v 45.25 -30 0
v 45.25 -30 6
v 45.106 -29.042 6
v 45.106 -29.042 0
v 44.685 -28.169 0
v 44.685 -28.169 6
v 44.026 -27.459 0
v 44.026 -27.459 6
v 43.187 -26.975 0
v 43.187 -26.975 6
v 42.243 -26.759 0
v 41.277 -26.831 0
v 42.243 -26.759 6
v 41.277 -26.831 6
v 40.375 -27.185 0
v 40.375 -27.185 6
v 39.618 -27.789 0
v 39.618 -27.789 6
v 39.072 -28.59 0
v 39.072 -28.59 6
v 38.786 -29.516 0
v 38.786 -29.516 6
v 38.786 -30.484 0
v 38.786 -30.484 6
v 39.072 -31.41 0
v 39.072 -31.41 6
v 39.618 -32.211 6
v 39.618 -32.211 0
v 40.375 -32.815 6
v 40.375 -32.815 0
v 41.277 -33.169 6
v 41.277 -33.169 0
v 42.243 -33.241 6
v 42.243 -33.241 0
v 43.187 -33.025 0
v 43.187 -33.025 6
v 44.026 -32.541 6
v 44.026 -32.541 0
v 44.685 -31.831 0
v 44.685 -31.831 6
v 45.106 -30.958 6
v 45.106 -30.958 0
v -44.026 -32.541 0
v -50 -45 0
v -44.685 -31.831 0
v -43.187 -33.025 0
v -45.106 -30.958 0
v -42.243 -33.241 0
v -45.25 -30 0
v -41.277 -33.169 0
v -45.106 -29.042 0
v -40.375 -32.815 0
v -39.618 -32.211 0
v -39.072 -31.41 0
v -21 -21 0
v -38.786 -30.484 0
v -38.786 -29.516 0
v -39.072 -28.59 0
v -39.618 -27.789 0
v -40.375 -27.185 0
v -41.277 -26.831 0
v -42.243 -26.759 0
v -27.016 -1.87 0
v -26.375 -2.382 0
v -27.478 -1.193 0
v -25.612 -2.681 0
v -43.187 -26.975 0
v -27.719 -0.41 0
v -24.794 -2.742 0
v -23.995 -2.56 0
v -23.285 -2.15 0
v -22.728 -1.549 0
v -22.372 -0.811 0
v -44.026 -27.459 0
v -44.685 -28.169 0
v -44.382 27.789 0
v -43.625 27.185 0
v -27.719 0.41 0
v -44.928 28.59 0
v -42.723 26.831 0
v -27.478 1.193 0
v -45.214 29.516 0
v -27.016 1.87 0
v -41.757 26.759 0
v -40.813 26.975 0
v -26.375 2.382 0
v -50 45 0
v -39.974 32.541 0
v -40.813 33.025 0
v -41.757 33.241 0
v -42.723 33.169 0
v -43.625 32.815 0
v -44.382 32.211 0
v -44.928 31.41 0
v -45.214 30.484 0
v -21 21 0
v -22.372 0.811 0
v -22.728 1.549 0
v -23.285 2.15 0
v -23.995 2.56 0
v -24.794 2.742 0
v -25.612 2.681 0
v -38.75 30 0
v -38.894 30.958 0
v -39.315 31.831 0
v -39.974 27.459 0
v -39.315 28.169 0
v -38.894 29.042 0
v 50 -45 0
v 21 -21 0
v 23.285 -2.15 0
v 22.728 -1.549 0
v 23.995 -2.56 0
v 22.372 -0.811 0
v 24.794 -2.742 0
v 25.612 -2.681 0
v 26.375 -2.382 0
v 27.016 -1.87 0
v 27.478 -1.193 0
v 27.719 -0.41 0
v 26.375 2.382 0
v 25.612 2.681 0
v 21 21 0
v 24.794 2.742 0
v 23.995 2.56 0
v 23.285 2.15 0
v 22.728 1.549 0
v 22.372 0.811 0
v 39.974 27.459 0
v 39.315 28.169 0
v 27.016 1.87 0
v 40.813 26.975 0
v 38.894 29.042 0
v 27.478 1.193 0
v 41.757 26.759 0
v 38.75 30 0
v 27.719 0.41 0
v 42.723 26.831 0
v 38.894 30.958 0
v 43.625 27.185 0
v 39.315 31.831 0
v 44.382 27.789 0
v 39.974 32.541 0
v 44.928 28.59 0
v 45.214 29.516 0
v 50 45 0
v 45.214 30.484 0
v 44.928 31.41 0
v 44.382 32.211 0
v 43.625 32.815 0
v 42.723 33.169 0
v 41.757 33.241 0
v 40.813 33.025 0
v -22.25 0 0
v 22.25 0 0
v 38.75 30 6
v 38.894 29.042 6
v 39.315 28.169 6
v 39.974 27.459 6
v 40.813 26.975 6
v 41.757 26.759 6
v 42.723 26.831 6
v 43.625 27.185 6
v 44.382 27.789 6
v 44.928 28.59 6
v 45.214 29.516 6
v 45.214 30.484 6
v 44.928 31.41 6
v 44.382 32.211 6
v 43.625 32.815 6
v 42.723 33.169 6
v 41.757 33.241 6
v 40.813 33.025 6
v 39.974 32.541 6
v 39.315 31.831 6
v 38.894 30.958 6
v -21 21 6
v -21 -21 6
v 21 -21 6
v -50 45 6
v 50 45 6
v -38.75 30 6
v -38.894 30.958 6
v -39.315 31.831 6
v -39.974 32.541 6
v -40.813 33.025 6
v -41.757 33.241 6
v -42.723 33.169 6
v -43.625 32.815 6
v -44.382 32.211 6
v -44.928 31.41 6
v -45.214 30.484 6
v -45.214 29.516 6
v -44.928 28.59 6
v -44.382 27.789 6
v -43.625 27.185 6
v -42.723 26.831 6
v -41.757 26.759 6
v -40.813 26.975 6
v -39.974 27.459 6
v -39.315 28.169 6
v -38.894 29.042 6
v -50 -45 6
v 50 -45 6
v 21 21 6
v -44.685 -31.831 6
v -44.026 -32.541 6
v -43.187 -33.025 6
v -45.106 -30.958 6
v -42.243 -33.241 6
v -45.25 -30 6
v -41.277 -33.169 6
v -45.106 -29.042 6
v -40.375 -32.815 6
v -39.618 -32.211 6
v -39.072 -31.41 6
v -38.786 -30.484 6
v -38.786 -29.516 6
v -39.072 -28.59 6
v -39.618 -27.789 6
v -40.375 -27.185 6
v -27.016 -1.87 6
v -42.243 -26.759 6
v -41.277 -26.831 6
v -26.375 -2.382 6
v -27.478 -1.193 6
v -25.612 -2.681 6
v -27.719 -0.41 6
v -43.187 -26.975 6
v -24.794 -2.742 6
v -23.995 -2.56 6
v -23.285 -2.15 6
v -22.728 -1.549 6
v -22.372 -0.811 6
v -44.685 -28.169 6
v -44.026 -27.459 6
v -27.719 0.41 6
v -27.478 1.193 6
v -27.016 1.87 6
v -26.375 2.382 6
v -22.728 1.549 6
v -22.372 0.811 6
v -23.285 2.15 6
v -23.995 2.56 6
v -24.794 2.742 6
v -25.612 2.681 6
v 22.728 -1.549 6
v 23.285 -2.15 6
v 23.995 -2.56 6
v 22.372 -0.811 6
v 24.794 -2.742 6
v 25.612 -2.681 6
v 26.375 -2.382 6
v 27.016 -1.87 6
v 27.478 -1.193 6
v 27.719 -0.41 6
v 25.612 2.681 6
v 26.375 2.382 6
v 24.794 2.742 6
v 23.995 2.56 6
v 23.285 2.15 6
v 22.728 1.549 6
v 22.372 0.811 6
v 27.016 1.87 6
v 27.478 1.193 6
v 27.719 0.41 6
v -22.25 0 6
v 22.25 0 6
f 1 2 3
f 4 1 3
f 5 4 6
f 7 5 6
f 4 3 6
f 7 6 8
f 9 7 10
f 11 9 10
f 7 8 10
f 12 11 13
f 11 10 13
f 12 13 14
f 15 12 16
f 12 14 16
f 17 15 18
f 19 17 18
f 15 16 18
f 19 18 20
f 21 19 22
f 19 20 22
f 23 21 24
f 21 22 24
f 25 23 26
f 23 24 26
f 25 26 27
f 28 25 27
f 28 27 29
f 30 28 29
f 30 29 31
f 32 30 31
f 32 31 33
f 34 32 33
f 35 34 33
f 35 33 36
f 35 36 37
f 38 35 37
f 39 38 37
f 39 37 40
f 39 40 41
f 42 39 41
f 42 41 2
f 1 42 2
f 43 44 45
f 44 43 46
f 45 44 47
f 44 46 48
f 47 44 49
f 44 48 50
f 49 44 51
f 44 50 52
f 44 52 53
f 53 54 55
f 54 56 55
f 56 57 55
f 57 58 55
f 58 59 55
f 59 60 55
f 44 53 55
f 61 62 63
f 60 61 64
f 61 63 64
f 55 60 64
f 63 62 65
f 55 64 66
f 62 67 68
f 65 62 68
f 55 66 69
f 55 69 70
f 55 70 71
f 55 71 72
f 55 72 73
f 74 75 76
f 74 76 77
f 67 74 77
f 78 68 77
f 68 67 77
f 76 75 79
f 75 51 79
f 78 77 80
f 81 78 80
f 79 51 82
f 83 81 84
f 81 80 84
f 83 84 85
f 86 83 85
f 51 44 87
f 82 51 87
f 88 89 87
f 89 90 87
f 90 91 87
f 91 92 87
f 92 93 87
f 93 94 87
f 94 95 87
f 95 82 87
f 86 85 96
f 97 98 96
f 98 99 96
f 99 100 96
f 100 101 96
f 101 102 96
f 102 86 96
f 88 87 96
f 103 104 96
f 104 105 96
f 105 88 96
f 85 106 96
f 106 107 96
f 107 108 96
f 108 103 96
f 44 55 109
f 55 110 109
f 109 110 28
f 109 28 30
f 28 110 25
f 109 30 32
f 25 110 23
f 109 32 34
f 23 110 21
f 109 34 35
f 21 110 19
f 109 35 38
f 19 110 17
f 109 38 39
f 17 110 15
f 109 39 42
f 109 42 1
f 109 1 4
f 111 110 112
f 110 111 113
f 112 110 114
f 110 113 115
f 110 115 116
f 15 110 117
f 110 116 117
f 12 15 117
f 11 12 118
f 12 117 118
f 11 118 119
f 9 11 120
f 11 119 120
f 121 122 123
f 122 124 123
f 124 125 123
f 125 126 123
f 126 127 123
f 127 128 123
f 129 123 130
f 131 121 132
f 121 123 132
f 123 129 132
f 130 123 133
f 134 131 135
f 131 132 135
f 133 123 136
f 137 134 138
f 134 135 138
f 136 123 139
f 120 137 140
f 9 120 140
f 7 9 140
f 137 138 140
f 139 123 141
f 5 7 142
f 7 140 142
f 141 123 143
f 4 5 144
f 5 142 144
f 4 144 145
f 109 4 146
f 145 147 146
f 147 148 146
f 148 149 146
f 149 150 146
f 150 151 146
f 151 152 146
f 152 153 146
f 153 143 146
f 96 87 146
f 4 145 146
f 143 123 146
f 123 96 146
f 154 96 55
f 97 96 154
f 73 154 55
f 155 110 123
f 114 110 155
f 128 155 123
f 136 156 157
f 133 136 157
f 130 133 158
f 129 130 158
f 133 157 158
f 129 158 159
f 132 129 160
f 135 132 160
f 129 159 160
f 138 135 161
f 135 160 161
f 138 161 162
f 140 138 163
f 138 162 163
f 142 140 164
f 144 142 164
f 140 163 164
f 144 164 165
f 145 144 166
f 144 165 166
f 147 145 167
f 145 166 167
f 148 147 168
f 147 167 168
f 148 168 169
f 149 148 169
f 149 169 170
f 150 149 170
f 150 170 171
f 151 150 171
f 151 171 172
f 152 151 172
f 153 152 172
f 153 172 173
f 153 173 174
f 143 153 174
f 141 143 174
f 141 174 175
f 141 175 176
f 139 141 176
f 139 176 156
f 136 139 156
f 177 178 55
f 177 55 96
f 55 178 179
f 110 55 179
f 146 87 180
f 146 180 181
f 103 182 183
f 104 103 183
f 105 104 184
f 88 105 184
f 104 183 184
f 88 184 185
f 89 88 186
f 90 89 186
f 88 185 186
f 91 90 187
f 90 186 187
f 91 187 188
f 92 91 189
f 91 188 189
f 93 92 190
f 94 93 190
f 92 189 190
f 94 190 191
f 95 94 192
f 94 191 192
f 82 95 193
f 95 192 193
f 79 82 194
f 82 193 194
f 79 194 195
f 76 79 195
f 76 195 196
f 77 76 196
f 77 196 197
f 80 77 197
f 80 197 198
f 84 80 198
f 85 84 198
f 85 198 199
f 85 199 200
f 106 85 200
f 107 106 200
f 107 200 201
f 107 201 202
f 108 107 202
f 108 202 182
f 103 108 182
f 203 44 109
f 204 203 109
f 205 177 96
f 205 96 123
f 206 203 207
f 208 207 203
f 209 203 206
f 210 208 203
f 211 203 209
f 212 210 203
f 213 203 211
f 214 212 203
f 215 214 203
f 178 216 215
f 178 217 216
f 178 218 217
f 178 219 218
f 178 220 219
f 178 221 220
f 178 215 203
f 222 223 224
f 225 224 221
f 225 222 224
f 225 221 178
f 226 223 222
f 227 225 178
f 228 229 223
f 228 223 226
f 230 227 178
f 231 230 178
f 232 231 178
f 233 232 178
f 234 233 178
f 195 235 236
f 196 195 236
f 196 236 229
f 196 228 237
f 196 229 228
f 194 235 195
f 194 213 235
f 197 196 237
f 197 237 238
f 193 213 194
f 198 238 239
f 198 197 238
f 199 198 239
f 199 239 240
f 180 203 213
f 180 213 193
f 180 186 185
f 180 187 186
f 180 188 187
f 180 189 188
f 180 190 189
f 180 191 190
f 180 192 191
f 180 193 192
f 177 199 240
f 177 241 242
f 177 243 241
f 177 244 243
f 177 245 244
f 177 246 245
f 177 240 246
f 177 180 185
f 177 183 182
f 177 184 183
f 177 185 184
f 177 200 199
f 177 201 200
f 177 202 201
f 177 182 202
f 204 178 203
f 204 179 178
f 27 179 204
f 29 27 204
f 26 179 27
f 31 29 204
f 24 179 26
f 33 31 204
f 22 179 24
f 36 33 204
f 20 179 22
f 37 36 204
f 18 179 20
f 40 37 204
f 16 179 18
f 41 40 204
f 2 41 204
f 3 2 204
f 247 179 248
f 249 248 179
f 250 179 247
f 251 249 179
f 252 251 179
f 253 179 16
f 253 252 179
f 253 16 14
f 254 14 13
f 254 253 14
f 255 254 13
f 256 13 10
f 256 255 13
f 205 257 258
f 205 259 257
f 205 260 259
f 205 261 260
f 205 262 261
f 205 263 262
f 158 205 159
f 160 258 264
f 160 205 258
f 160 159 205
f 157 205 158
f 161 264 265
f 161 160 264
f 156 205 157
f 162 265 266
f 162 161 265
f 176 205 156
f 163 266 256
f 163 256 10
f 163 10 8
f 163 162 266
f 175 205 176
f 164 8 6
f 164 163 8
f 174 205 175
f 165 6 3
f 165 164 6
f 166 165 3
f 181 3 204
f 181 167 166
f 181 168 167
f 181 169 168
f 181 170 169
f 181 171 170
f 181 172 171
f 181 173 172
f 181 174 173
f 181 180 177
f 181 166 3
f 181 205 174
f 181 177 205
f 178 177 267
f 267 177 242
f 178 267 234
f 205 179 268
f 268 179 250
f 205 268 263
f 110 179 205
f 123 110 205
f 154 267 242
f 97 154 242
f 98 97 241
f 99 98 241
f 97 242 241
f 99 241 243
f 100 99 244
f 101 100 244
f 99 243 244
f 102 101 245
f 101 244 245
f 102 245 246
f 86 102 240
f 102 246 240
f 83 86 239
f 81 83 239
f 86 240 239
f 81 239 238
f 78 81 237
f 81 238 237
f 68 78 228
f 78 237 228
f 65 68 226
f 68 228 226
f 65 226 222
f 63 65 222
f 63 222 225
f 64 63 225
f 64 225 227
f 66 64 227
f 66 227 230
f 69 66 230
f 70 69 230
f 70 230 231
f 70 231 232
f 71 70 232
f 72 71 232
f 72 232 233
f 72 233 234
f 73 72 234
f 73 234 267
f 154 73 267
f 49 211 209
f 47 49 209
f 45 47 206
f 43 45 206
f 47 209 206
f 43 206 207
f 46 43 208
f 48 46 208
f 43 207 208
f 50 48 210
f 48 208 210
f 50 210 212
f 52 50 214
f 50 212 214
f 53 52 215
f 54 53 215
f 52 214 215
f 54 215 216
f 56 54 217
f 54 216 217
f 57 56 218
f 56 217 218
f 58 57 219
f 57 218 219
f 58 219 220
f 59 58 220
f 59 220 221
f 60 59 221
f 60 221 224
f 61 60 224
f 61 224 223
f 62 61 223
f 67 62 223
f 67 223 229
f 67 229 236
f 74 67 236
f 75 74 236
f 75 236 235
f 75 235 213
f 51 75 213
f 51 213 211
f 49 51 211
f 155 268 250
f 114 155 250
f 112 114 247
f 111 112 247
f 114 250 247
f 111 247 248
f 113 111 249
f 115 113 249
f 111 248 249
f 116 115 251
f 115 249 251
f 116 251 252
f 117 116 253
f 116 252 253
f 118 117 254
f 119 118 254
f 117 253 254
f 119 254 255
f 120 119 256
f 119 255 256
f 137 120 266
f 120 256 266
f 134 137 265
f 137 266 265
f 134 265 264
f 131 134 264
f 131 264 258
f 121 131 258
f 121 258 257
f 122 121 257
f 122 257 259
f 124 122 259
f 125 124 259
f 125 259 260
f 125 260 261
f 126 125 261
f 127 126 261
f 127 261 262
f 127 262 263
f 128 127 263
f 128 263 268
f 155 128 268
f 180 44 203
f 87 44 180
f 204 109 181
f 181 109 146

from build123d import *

# Parameters (mm, degrees)
SKETCH1_W           = 100
SKETCH1_H           = 90
BOSS_EXTRUDE1_DEPTH = 6
SKETCH2_R           = 2.75
SKETCH2_R_2         = 3.25
CUT_EXTRUDE1_DEPTH  = 68.53517602
SKETCH3_W           = 42
SKETCH3_H           = 42
CUT_EXTRUDE2_DEPTH  = 10


with BuildPart() as part:
    # Sketch1 → Boss-Extrude1 (new body)
    with BuildSketch(Plane.XY):
        Rectangle(SKETCH1_W, SKETCH1_H)
    extrude(amount=BOSS_EXTRUDE1_DEPTH)

    # Sketch2 → Cut-Extrude1 (cut, through all)
    with BuildSketch(Plane.XY.offset(6)):
        with Locations((-25, 0)):
            Circle(SKETCH2_R)
        with Locations((-42, 30)):
            Circle(SKETCH2_R_2)
        with Locations(Location((-42, -30, 0), (0, 0, 180))):
            Circle(SKETCH2_R_2)
        with Locations((42, -30)):
            Circle(SKETCH2_R_2)
        with Locations(Location((25, 0, 0), (0, 0, 180))):
            Circle(SKETCH2_R)
        with Locations(Location((42, 30, 0), (0, 0, 180))):
            Circle(SKETCH2_R_2)
    extrude(amount=-CUT_EXTRUDE1_DEPTH, mode=Mode.SUBTRACT)

    # Sketch3 → Cut-Extrude2 (cut)
    with BuildSketch(Plane.XY.offset(6)):
        Rectangle(SKETCH3_W, SKETCH3_H)
    extrude(amount=-CUT_EXTRUDE2_DEPTH, mode=Mode.SUBTRACT)


solid = part.part
